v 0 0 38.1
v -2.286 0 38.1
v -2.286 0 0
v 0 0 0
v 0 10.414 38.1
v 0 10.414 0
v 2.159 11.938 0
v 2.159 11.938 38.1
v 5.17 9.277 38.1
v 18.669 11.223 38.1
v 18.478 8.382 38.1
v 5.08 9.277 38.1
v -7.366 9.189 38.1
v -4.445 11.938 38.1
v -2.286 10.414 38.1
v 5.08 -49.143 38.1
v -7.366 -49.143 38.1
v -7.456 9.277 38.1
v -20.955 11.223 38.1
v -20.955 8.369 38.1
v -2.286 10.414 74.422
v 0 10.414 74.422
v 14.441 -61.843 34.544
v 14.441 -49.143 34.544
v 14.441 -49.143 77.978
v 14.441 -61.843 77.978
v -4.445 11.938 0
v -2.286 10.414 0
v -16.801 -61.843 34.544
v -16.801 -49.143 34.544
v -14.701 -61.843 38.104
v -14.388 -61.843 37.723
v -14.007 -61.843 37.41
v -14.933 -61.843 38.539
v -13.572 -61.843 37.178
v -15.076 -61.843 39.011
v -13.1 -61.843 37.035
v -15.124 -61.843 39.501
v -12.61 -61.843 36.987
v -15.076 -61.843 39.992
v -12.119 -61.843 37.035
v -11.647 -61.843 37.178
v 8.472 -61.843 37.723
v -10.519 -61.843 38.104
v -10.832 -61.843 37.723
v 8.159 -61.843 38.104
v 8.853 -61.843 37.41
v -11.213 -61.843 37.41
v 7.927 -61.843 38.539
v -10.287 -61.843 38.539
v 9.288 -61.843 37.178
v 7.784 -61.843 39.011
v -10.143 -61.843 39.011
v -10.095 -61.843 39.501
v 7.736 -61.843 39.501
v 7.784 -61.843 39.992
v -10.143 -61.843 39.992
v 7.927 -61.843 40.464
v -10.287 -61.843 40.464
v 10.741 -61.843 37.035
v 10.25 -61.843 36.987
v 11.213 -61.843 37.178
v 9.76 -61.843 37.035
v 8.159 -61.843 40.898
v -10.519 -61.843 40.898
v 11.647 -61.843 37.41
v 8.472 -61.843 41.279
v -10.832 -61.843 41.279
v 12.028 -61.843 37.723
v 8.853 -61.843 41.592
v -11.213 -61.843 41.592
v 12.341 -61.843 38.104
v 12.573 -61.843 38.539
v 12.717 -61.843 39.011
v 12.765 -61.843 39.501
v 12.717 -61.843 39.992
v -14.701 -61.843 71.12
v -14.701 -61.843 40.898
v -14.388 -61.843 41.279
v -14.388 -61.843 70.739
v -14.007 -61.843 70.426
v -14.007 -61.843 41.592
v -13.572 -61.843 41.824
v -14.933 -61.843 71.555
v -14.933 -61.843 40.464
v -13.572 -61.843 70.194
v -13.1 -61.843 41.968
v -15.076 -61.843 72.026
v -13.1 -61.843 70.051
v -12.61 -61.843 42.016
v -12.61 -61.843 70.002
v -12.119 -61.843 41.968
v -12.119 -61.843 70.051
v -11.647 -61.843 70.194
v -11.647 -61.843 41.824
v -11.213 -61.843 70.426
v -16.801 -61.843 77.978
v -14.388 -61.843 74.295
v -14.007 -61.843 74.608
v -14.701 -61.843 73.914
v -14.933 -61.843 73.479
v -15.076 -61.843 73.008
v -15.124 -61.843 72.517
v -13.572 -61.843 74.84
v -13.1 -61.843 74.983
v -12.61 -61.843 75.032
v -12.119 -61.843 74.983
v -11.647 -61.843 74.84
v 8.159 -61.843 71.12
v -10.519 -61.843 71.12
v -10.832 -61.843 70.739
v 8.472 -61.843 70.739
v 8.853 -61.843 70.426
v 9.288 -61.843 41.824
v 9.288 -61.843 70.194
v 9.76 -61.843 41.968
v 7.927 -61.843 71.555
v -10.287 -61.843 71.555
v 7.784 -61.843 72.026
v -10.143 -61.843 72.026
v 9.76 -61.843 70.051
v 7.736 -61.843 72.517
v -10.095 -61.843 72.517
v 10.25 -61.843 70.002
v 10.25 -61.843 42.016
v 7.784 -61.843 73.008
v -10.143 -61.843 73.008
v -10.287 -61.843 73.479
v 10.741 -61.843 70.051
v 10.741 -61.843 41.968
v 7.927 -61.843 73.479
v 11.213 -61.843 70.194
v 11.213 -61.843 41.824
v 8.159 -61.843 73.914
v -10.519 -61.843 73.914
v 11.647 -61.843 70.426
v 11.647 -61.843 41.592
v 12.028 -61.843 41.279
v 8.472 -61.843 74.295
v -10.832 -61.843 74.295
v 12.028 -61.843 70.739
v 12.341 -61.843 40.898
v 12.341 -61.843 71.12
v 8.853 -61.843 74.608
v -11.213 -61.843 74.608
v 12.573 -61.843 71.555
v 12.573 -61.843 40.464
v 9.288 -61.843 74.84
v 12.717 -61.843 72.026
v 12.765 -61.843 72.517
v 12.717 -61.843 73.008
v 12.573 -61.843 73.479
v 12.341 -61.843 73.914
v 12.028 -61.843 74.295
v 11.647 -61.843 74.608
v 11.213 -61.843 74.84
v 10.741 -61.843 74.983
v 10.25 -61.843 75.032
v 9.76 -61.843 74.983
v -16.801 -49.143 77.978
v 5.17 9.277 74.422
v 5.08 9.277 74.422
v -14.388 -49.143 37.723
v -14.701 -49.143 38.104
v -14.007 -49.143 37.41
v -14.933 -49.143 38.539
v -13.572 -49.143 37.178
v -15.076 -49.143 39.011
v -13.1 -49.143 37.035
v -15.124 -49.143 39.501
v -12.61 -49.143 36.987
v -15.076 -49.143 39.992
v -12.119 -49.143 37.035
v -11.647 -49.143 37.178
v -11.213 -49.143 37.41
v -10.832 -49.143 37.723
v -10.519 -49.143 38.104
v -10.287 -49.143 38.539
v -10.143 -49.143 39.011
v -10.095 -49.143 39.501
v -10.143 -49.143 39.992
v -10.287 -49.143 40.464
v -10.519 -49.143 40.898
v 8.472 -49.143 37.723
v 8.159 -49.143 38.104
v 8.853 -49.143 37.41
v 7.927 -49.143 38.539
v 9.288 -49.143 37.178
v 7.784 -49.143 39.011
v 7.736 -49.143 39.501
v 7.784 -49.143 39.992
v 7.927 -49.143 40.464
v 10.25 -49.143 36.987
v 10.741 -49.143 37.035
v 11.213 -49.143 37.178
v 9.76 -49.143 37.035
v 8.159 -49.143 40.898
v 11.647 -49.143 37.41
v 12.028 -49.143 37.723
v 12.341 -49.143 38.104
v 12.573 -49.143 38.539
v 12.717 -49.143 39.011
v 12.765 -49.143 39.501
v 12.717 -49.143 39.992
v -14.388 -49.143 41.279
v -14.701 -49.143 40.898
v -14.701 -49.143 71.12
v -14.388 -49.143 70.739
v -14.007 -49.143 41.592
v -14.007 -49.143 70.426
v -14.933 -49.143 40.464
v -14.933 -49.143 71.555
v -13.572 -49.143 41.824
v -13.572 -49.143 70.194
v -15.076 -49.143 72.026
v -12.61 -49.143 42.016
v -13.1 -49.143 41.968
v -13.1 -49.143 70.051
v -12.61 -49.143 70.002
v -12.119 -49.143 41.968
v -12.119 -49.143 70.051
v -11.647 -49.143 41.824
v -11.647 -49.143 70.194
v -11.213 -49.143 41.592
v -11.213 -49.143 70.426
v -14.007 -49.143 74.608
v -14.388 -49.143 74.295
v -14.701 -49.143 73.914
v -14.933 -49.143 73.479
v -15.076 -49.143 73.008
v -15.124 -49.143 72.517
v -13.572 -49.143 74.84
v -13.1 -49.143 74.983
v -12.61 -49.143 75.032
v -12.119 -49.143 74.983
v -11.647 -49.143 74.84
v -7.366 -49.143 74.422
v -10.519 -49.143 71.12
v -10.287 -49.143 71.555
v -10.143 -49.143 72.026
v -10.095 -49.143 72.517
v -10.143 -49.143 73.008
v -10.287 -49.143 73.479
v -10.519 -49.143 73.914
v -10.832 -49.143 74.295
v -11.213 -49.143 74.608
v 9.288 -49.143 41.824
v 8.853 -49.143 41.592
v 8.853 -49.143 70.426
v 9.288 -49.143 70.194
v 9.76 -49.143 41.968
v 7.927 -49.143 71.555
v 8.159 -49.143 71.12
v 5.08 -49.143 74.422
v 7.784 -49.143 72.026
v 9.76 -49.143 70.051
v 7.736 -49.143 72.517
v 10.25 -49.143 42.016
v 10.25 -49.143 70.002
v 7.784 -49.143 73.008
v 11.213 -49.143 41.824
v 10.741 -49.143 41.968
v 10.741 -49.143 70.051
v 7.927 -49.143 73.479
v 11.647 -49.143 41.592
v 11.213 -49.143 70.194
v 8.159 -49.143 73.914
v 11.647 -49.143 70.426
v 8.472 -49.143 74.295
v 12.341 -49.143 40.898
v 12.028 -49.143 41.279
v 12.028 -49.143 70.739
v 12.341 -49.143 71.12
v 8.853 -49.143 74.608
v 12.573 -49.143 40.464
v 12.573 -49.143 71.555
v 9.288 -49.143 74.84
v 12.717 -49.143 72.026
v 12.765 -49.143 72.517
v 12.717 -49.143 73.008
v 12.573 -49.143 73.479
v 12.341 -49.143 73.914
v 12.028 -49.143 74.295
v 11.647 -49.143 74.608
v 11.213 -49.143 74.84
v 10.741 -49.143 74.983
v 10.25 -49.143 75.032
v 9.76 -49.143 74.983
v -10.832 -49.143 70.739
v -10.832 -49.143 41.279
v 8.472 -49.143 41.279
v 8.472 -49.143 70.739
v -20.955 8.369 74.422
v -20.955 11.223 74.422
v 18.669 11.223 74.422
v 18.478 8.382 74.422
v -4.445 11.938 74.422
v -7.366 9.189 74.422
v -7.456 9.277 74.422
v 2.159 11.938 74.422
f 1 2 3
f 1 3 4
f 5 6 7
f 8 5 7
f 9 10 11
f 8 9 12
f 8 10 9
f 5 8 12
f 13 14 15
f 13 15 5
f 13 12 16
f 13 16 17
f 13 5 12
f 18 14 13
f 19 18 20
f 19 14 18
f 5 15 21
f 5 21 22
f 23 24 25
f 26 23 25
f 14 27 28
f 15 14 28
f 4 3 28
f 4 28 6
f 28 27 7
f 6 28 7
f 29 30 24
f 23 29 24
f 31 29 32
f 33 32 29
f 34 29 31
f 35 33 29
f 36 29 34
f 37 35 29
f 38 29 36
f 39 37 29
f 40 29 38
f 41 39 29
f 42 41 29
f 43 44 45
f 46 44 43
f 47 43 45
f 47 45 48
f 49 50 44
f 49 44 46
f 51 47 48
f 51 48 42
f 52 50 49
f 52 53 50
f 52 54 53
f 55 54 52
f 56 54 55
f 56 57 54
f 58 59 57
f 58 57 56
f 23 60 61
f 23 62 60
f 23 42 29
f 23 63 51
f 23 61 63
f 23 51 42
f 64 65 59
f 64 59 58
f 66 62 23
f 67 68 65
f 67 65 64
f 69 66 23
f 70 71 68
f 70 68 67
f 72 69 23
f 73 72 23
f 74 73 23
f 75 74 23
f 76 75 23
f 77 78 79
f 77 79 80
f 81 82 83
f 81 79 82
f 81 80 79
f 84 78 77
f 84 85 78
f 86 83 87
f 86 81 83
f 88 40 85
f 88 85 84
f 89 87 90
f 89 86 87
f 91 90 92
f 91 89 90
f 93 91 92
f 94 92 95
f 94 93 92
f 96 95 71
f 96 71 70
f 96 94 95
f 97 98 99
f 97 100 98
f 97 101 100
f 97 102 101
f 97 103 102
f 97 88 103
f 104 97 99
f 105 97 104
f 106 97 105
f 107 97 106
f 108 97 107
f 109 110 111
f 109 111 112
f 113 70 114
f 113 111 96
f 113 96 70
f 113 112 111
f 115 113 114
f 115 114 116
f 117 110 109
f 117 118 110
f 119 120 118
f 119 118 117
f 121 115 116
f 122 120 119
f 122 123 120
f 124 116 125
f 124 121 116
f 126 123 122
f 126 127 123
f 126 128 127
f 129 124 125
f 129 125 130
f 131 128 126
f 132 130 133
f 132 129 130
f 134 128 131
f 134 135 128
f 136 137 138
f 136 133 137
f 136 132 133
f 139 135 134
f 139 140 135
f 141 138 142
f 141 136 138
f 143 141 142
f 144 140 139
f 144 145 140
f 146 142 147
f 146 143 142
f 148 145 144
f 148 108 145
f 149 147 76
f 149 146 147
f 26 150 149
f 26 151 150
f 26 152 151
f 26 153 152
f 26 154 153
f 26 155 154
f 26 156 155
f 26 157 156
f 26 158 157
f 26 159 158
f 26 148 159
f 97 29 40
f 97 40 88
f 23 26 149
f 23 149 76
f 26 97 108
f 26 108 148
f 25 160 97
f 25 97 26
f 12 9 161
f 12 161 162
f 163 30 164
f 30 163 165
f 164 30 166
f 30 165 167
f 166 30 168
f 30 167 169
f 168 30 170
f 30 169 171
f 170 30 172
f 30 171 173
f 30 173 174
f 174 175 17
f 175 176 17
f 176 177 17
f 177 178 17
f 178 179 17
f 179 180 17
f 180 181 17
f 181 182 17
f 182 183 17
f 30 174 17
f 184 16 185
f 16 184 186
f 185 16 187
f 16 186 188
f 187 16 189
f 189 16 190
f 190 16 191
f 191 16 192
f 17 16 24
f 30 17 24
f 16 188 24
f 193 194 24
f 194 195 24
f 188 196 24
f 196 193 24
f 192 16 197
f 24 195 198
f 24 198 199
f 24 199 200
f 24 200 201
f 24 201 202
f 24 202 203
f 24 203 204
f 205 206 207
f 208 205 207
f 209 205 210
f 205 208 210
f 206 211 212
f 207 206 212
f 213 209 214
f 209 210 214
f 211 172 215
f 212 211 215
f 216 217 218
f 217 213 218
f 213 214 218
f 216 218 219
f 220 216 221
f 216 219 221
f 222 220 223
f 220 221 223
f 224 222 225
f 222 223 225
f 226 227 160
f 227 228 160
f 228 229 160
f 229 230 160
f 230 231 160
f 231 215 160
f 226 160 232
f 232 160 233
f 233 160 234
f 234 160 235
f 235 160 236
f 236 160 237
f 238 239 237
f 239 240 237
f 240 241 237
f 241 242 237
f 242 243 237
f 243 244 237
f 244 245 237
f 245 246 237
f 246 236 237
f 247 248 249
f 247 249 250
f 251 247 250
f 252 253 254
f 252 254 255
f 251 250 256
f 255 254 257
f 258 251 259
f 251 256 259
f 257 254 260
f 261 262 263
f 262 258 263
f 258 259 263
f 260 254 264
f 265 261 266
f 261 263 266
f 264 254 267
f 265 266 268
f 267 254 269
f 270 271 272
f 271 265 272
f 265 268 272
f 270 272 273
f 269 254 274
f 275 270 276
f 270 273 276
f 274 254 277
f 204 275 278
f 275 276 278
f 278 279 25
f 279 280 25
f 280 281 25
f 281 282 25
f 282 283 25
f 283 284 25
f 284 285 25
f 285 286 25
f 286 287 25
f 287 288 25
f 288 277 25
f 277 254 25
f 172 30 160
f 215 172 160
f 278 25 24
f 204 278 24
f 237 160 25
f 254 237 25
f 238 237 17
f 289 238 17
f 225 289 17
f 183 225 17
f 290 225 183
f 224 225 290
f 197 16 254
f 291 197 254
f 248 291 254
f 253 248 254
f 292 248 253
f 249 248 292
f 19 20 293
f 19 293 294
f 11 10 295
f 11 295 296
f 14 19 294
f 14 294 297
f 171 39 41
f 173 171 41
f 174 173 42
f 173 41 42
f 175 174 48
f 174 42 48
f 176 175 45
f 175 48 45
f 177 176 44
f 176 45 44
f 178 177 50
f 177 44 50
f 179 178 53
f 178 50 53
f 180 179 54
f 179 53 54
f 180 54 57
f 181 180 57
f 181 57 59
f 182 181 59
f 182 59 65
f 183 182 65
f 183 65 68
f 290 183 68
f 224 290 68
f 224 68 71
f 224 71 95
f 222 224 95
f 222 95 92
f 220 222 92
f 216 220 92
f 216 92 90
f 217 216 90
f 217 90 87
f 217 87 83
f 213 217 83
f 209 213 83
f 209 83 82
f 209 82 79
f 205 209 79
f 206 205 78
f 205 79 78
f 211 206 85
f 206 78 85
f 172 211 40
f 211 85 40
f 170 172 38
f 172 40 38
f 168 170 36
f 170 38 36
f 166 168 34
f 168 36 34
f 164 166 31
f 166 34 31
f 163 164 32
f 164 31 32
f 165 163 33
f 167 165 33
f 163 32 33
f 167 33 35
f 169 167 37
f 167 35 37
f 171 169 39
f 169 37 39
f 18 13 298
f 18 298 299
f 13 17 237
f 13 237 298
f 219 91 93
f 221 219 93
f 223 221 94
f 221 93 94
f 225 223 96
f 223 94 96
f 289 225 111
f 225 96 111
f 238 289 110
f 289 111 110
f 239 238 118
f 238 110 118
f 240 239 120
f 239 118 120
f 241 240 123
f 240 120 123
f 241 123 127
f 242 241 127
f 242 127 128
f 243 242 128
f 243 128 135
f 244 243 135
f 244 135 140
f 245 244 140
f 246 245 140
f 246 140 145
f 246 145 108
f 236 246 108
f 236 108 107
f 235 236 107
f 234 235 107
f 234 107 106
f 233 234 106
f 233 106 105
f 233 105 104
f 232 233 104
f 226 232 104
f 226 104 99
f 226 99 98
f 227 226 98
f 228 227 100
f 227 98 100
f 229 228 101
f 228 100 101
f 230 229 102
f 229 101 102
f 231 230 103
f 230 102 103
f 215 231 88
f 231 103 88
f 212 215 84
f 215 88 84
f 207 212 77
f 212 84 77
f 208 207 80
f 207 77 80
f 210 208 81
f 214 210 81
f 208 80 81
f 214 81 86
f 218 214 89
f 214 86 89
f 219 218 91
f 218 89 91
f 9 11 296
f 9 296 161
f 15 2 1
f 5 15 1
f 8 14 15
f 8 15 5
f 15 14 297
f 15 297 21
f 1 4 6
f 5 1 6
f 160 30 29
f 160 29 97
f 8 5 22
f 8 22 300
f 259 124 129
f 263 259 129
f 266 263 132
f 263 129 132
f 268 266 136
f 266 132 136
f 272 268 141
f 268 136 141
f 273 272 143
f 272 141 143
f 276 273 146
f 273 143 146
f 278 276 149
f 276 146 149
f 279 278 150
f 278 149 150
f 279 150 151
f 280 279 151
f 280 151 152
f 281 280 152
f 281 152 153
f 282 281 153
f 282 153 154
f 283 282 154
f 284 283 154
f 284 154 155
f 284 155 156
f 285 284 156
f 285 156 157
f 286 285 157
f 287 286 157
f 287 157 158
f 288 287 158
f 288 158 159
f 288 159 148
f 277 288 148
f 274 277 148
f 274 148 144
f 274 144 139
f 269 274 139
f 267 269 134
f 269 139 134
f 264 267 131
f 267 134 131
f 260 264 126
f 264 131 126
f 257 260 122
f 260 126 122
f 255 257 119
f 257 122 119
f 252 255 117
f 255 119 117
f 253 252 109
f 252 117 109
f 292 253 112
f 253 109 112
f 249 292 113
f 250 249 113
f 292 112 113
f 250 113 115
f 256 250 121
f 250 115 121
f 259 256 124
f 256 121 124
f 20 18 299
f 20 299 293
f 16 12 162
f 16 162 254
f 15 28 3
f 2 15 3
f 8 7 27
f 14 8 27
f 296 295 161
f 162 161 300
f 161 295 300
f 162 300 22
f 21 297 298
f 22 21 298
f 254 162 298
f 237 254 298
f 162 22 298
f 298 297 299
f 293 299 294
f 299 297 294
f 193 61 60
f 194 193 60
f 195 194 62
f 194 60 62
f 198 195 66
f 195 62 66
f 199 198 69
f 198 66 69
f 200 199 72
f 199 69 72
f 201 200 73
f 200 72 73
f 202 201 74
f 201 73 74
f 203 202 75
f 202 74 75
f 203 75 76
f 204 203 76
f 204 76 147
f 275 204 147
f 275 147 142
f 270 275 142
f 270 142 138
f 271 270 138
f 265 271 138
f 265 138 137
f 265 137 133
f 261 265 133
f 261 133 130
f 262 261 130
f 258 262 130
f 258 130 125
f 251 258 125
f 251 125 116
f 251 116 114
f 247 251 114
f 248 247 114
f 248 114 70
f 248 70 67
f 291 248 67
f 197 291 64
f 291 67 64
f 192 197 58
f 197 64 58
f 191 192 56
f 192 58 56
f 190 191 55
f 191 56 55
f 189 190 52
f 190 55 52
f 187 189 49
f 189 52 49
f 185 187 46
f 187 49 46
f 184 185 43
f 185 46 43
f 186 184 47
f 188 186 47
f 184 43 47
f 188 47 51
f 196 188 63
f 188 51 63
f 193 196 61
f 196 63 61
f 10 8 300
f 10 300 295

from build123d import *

# Parameters (mm, degrees)
SALIENTE_EXTRUIR1_DEPTH = 38.1
SALIENTE_EXTRUIR2_DEPTH = 36.322
CROQUIS5_W              = 31.242
CROQUIS5_H              = 43.434
SALIENTE_EXTRUIR3_DEPTH = 12.7
CROQUIS6_R              = 2.5146
CORTAR_EXTRUIR6_DEPTH   = 13.97


with BuildPart() as part:
    # Croquis2 → Saliente-Extruir1 (new body)
    with BuildSketch(Plane.XY):
        Polygon((0, 0), (0, 10.414), (2.159, 11.938), (-4.445, 11.938), (-2.286, 10.414), (-2.286, 0), align=None)
    extrude(amount=SALIENTE_EXTRUIR1_DEPTH)


with BuildPart() as body_2:
    # Croquis3 → Saliente-Extruir2 (new body)
    with BuildSketch(Plane.XY.offset(38.1)):
        Polygon((-7.366, -49.142919253), (-7.366, 9.189032695), (-7.456229251, 9.277080747), (-20.955, 8.369352225), (-20.955, 11.222937646), (-4.445, 11.938), (-2.286, 10.414), (0, 10.414), (2.159, 11.938), (18.669, 11.222937646), (18.477973677, 8.382197842), (5.170229251, 9.277080747), (5.08, 9.277080747), (5.08, -49.142919253), align=None)
    extrude(amount=SALIENTE_EXTRUIR2_DEPTH)

    # Croquis5 → Saliente-Extruir3 (add)
    with BuildSketch(Plane.XZ.offset(49.142919253)):
        with Locations((-1.179770749, 56.261)):
            Rectangle(CROQUIS5_W, CROQUIS5_H)
    extrude(amount=SALIENTE_EXTRUIR3_DEPTH)

    # Croquis6 → Cortar-Extruir6 (cut)
    with BuildSketch(Plane.XZ.offset(61.842919253)):
        with Locations(Location((-12.609770351, 72.517, 0), (0, 0, 270))):
            Circle(CROQUIS6_R)
        with Locations(Location((10.250229251, 72.517, 0), (0, 0, 270))):
            Circle(CROQUIS6_R)
        with Locations(Location((10.250229251, 39.501266304, 0), (0, 0, 270))):
            Circle(CROQUIS6_R)
        with Locations(Location((-12.609770351, 39.501266304, 0), (0, 0, 270))):
            Circle(CROQUIS6_R)
    extrude(amount=-CORTAR_EXTRUIR6_DEPTH, mode=Mode.SUBTRACT)


solid = Compound([part.part, body_2.part])
